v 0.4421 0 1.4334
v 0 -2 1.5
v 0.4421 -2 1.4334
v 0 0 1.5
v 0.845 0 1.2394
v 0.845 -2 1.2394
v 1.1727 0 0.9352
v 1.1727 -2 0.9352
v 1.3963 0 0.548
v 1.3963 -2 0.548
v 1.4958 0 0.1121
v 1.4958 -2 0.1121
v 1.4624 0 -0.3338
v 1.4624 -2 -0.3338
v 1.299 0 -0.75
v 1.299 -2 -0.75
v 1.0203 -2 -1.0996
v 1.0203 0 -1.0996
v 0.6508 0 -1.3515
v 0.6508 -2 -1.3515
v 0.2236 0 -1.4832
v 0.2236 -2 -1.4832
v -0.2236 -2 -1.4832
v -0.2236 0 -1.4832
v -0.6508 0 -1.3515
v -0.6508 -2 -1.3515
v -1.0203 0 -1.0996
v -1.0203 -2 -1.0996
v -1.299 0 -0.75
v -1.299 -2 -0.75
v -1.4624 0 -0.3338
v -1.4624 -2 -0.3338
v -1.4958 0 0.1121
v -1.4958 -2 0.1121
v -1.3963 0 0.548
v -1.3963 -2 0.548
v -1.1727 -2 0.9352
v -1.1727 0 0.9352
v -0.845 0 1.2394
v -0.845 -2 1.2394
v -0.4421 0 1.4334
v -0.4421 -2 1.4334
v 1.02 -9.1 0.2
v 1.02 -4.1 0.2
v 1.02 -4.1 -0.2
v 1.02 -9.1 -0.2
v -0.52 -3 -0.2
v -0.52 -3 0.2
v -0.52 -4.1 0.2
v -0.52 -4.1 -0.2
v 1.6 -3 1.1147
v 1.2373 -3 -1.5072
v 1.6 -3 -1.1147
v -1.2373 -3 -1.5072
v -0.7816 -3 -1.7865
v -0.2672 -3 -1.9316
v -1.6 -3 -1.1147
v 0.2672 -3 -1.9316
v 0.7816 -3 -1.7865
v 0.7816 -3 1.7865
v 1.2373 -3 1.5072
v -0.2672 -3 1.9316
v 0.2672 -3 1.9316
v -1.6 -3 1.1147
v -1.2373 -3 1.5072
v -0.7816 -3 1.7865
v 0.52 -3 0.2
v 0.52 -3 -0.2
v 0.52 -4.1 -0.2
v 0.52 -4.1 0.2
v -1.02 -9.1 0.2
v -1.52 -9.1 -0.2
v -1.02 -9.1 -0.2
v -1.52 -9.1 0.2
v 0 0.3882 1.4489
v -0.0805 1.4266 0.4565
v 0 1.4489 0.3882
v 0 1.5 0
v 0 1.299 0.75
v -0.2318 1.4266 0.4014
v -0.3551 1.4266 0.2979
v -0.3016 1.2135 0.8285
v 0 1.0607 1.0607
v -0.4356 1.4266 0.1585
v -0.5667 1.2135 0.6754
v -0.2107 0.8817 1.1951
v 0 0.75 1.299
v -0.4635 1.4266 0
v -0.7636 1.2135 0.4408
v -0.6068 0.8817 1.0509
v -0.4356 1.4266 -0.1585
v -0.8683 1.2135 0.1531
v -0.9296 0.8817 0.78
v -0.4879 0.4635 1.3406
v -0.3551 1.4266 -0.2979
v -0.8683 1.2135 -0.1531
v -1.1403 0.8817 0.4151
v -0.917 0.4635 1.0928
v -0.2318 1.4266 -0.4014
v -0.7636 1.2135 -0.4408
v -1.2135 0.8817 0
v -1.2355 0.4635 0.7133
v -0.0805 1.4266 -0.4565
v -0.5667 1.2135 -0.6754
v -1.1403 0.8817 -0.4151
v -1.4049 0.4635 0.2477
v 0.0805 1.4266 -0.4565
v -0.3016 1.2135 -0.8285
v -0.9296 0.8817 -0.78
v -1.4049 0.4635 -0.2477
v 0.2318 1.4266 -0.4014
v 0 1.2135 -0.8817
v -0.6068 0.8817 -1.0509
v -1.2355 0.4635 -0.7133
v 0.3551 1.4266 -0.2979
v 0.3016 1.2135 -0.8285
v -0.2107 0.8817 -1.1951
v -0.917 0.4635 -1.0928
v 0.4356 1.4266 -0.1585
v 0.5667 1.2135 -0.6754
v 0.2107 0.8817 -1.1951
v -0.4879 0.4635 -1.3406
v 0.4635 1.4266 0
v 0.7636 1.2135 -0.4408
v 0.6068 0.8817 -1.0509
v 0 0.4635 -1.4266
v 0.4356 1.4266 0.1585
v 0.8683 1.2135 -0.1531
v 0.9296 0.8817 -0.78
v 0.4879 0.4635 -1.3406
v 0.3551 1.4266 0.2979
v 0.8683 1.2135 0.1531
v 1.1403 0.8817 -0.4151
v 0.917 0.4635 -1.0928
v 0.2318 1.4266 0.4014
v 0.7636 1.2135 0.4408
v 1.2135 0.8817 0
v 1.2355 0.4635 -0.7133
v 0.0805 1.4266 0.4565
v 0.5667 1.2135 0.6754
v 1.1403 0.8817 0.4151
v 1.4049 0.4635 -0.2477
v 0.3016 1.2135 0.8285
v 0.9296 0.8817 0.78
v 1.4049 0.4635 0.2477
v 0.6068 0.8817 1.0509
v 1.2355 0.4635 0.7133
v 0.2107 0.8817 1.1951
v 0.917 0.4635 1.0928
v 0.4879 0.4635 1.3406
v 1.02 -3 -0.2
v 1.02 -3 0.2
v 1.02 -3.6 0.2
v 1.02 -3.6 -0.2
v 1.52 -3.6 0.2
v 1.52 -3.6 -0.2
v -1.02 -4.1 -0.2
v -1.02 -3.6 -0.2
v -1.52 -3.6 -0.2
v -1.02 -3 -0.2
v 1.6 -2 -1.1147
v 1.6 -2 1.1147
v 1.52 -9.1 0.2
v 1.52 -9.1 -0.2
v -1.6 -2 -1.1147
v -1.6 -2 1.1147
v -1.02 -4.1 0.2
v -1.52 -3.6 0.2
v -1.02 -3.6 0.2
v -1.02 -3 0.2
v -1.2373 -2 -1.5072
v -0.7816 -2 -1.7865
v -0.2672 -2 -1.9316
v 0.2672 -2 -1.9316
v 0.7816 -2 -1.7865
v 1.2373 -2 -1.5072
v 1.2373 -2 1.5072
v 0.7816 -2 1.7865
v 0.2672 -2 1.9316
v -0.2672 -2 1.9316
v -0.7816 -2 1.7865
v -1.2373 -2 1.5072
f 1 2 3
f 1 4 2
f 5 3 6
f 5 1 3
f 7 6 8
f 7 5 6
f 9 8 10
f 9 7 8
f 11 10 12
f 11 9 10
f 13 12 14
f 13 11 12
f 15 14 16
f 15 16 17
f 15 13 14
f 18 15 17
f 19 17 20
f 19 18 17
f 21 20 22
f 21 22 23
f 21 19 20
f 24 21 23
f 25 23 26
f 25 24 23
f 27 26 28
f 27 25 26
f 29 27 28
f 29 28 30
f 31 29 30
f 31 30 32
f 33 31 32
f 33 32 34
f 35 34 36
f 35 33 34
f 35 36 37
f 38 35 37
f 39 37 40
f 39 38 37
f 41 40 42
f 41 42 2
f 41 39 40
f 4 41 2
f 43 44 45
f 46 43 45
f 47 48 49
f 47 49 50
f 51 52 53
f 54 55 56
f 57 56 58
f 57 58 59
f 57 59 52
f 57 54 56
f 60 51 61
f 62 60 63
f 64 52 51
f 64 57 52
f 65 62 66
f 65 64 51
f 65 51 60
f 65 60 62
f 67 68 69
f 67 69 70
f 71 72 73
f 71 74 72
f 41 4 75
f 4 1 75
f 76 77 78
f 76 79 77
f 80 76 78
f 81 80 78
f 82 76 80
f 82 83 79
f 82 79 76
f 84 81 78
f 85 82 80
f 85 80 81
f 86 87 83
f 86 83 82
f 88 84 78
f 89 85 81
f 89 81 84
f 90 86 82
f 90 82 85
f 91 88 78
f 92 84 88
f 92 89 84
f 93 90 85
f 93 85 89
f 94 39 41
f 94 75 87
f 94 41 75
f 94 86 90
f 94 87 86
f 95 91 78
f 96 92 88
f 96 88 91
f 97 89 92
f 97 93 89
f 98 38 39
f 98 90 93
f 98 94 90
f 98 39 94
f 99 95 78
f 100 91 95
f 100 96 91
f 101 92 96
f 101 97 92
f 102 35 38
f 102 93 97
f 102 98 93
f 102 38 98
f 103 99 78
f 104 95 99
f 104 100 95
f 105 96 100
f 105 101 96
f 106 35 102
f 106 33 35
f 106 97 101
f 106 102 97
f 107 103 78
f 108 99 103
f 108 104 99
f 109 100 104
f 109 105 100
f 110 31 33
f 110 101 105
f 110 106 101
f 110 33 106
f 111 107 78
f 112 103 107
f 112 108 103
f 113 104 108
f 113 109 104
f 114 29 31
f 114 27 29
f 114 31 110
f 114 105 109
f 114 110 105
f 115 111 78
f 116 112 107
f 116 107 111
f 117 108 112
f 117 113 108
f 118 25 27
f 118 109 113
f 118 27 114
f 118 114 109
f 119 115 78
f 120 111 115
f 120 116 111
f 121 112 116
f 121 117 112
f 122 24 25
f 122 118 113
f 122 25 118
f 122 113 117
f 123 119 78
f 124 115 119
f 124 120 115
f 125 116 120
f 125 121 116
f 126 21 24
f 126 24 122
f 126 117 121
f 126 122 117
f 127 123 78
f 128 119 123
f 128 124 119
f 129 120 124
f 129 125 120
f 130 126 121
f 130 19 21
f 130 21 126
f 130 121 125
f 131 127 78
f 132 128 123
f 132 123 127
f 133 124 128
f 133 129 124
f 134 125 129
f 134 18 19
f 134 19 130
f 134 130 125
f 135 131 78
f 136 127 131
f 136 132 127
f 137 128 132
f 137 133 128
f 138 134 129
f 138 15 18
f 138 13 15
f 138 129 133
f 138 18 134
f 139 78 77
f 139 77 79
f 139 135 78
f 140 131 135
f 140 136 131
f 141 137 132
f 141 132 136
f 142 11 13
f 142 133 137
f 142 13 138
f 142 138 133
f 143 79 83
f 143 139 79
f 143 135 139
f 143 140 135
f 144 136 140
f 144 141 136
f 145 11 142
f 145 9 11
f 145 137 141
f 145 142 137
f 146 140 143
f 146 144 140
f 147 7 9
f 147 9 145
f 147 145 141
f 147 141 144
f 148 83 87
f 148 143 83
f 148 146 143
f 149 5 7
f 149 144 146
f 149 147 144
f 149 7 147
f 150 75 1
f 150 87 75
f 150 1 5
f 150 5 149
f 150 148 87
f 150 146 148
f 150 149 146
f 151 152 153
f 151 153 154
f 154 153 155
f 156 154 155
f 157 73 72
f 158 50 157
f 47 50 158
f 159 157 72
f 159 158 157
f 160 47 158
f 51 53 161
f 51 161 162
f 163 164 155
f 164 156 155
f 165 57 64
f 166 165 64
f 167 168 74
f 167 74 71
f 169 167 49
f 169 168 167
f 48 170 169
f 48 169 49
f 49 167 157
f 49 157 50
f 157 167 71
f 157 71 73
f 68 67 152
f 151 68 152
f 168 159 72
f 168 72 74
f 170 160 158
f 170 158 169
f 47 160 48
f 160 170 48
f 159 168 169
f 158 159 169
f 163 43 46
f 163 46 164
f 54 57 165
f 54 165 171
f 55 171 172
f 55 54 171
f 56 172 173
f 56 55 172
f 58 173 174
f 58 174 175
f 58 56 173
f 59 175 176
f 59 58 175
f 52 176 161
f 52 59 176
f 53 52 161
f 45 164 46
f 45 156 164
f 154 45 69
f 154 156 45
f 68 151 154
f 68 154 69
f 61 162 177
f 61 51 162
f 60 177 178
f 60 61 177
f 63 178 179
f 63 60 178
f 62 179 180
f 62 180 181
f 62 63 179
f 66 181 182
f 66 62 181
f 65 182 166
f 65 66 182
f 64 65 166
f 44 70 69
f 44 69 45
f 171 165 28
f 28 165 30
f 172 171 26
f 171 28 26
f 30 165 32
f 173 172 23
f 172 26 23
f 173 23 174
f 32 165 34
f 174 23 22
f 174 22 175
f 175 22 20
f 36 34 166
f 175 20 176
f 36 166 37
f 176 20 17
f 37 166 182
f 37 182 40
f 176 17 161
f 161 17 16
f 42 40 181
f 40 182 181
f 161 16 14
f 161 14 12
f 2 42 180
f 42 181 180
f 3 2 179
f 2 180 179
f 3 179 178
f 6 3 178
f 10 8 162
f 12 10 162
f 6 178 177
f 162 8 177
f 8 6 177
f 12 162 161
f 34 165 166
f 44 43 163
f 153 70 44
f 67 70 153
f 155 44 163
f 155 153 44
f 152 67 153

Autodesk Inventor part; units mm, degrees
ref_plane "YZ Plane" through (0, 0, 0) normal (1, 0, 0) x (0, 1, 0)
ref_plane "XZ Plane" through (0, 0, 0) normal (0, 1, 0) x (-1, 0, 0)
ref_plane "XY Plane" through (0, 0, 0) normal (0, 0, 1) x (1, 0, 0)
sketch "Sketch1" plane through (0, 0, 0) normal (1, 0, 0) x (0, 1, 0)
  arc A0 (1.5, 0) -> (0, 1.5) centre (0, 0) ccw
  line L0 (-3, 0) -> (-3, 1.5)
  line L1 (-3, 1.5) -> (0, 1.5)
  line L2 (1.5, 0) -> (-3, 0)
  dimension "d0" = 1.5
  dimension "d1" = 4.5
revolve "Revolution1" add sketch "Sketch1" angle 360 about axis through (0, 1.5, 0) along (0, -1, 0)
sketch "Sketch2" plane through (0, -3, 0) normal (0, -1, 0) x (1, 0, 0)
  circle A0 centre (0, 0) radius 1.95
  dimension "d3" = 3.9
extrude "Extrusion1" add sketch "Sketch2" against normal blind 1
sketch "Sketch3" plane through (0, -3, 0) normal (0, -1, 0) x (1, 0, 0)
  circle A0 centre (0, 0) radius 1.6
  line L0 (1.6, -1.1147) -> (1.6, 1.1147)
  line L1 (-1.6, -1.1147) -> (-1.6, 1.1147)
  circle A1 centre (0, 0) radius 1.95 projected
  dimension "d6" = 3.2
extrude "Extrusion2" cut sketch "Sketch3" against normal through all contours L0 A1 | L1 A1
sketch "Sketch4" plane through (0, -3, 0) normal (0, -1, 0) x (1, 0, 0)
  line L0 (1.02, -0.2) -> (0.52, -0.2)
  line L1 (0.52, -0.2) -> (0.52, 0.2)
  line L2 (0.52, 0.2) -> (1.02, 0.2)
  line L3 (1.02, 0.2) -> (1.02, -0.2)
  line L4 (1.02, -0.2) -> (0.52, 0.2) construction
  line L5 (0.52, -0.2) -> (1.02, 0.2) construction
  line L6 (-0.52, -0.2) -> (-1.02, -0.2)
  line L7 (-1.02, -0.2) -> (-1.02, 0.2)
  line L8 (-1.02, 0.2) -> (-0.52, 0.2)
  line L9 (-0.52, 0.2) -> (-0.52, -0.2)
  line L10 (-0.52, -0.2) -> (-1.02, 0.2) construction
  line L11 (-1.02, -0.2) -> (-0.52, 0.2) construction
  line L12 (0, 0) -> (0, -0.871)
  line L13 (0, 0) -> (-0.6551, 0)
  point P0 (0.77, 0)
  point P1 (-0.77, 0)
  point P2 (-0.77, 0)
  point P3 (0.77, 0)
  point P4 (-0.77, 0)
  dimension "d9" = 1.54
  dimension "d10" = 0.4
  dimension "d11" = 0.5
extrude "Extrusion3" add sketch "Sketch4" along normal blind 1.1 separate body
sketch "Sketch5" plane through (0, -4.1, 0) normal (0, -1, 0) x (1, 0, 0)
  line L0 (0.52, -0.2) -> (1.02, -0.2) projected
  line L1 (0.52, -0.2) -> (1.52, -0.2)
  line L2 (1.52, -0.2) -> (1.52, 0.2)
  line L3 (1.52, 0.2) -> (0.52, 0.2)
  line L4 (0.52, 0.2) -> (0.52, -0.2)
  line L5 (-0.52, -0.2) -> (-0.52, 0.2) projected
  line L6 (-0.52, -0.2) -> (-1.52, -0.2)
  line L7 (-1.52, -0.2) -> (-1.52, 0.2)
  line L8 (-1.52, 0.2) -> (-0.52, 0.2)
  line L9 (-0.52, 0.2) -> (-0.52, -0.2)
  line L10 (1.02, -0.2) -> (1.52, -0.2)
  line L11 (1.52, -0.2) -> (1.52, 0.2)
  line L12 (1.52, 0.2) -> (1.02, 0.2)
  line L13 (1.02, 0.2) -> (1.02, -0.2)
  line L14 (-1.02, -0.2) -> (-0.52, -0.2) projected
  line L15 (-1.02, 0.2) -> (-1.02, -0.2) projected
  line L16 (-0.52, -0.2) -> (-1.02, -0.2)
  line L17 (-1.02, -0.2) -> (-1.02, 0.2)
  line L18 (-1.02, 0.2) -> (-0.52, 0.2)
  line L19 (-0.52, 0.2) -> (-0.52, -0.2)
  point P0 (0, 0)
  dimension "d14" = 1
  dimension "d15" = 1
extrude "Extrusion4" add sketch "Sketch5" along normal blind 5 and the other way blind 0.5 contours L13 L3 L2 L1 | L6 L7 L8 L15 bodies 2
properties part number "TEFT4300"
